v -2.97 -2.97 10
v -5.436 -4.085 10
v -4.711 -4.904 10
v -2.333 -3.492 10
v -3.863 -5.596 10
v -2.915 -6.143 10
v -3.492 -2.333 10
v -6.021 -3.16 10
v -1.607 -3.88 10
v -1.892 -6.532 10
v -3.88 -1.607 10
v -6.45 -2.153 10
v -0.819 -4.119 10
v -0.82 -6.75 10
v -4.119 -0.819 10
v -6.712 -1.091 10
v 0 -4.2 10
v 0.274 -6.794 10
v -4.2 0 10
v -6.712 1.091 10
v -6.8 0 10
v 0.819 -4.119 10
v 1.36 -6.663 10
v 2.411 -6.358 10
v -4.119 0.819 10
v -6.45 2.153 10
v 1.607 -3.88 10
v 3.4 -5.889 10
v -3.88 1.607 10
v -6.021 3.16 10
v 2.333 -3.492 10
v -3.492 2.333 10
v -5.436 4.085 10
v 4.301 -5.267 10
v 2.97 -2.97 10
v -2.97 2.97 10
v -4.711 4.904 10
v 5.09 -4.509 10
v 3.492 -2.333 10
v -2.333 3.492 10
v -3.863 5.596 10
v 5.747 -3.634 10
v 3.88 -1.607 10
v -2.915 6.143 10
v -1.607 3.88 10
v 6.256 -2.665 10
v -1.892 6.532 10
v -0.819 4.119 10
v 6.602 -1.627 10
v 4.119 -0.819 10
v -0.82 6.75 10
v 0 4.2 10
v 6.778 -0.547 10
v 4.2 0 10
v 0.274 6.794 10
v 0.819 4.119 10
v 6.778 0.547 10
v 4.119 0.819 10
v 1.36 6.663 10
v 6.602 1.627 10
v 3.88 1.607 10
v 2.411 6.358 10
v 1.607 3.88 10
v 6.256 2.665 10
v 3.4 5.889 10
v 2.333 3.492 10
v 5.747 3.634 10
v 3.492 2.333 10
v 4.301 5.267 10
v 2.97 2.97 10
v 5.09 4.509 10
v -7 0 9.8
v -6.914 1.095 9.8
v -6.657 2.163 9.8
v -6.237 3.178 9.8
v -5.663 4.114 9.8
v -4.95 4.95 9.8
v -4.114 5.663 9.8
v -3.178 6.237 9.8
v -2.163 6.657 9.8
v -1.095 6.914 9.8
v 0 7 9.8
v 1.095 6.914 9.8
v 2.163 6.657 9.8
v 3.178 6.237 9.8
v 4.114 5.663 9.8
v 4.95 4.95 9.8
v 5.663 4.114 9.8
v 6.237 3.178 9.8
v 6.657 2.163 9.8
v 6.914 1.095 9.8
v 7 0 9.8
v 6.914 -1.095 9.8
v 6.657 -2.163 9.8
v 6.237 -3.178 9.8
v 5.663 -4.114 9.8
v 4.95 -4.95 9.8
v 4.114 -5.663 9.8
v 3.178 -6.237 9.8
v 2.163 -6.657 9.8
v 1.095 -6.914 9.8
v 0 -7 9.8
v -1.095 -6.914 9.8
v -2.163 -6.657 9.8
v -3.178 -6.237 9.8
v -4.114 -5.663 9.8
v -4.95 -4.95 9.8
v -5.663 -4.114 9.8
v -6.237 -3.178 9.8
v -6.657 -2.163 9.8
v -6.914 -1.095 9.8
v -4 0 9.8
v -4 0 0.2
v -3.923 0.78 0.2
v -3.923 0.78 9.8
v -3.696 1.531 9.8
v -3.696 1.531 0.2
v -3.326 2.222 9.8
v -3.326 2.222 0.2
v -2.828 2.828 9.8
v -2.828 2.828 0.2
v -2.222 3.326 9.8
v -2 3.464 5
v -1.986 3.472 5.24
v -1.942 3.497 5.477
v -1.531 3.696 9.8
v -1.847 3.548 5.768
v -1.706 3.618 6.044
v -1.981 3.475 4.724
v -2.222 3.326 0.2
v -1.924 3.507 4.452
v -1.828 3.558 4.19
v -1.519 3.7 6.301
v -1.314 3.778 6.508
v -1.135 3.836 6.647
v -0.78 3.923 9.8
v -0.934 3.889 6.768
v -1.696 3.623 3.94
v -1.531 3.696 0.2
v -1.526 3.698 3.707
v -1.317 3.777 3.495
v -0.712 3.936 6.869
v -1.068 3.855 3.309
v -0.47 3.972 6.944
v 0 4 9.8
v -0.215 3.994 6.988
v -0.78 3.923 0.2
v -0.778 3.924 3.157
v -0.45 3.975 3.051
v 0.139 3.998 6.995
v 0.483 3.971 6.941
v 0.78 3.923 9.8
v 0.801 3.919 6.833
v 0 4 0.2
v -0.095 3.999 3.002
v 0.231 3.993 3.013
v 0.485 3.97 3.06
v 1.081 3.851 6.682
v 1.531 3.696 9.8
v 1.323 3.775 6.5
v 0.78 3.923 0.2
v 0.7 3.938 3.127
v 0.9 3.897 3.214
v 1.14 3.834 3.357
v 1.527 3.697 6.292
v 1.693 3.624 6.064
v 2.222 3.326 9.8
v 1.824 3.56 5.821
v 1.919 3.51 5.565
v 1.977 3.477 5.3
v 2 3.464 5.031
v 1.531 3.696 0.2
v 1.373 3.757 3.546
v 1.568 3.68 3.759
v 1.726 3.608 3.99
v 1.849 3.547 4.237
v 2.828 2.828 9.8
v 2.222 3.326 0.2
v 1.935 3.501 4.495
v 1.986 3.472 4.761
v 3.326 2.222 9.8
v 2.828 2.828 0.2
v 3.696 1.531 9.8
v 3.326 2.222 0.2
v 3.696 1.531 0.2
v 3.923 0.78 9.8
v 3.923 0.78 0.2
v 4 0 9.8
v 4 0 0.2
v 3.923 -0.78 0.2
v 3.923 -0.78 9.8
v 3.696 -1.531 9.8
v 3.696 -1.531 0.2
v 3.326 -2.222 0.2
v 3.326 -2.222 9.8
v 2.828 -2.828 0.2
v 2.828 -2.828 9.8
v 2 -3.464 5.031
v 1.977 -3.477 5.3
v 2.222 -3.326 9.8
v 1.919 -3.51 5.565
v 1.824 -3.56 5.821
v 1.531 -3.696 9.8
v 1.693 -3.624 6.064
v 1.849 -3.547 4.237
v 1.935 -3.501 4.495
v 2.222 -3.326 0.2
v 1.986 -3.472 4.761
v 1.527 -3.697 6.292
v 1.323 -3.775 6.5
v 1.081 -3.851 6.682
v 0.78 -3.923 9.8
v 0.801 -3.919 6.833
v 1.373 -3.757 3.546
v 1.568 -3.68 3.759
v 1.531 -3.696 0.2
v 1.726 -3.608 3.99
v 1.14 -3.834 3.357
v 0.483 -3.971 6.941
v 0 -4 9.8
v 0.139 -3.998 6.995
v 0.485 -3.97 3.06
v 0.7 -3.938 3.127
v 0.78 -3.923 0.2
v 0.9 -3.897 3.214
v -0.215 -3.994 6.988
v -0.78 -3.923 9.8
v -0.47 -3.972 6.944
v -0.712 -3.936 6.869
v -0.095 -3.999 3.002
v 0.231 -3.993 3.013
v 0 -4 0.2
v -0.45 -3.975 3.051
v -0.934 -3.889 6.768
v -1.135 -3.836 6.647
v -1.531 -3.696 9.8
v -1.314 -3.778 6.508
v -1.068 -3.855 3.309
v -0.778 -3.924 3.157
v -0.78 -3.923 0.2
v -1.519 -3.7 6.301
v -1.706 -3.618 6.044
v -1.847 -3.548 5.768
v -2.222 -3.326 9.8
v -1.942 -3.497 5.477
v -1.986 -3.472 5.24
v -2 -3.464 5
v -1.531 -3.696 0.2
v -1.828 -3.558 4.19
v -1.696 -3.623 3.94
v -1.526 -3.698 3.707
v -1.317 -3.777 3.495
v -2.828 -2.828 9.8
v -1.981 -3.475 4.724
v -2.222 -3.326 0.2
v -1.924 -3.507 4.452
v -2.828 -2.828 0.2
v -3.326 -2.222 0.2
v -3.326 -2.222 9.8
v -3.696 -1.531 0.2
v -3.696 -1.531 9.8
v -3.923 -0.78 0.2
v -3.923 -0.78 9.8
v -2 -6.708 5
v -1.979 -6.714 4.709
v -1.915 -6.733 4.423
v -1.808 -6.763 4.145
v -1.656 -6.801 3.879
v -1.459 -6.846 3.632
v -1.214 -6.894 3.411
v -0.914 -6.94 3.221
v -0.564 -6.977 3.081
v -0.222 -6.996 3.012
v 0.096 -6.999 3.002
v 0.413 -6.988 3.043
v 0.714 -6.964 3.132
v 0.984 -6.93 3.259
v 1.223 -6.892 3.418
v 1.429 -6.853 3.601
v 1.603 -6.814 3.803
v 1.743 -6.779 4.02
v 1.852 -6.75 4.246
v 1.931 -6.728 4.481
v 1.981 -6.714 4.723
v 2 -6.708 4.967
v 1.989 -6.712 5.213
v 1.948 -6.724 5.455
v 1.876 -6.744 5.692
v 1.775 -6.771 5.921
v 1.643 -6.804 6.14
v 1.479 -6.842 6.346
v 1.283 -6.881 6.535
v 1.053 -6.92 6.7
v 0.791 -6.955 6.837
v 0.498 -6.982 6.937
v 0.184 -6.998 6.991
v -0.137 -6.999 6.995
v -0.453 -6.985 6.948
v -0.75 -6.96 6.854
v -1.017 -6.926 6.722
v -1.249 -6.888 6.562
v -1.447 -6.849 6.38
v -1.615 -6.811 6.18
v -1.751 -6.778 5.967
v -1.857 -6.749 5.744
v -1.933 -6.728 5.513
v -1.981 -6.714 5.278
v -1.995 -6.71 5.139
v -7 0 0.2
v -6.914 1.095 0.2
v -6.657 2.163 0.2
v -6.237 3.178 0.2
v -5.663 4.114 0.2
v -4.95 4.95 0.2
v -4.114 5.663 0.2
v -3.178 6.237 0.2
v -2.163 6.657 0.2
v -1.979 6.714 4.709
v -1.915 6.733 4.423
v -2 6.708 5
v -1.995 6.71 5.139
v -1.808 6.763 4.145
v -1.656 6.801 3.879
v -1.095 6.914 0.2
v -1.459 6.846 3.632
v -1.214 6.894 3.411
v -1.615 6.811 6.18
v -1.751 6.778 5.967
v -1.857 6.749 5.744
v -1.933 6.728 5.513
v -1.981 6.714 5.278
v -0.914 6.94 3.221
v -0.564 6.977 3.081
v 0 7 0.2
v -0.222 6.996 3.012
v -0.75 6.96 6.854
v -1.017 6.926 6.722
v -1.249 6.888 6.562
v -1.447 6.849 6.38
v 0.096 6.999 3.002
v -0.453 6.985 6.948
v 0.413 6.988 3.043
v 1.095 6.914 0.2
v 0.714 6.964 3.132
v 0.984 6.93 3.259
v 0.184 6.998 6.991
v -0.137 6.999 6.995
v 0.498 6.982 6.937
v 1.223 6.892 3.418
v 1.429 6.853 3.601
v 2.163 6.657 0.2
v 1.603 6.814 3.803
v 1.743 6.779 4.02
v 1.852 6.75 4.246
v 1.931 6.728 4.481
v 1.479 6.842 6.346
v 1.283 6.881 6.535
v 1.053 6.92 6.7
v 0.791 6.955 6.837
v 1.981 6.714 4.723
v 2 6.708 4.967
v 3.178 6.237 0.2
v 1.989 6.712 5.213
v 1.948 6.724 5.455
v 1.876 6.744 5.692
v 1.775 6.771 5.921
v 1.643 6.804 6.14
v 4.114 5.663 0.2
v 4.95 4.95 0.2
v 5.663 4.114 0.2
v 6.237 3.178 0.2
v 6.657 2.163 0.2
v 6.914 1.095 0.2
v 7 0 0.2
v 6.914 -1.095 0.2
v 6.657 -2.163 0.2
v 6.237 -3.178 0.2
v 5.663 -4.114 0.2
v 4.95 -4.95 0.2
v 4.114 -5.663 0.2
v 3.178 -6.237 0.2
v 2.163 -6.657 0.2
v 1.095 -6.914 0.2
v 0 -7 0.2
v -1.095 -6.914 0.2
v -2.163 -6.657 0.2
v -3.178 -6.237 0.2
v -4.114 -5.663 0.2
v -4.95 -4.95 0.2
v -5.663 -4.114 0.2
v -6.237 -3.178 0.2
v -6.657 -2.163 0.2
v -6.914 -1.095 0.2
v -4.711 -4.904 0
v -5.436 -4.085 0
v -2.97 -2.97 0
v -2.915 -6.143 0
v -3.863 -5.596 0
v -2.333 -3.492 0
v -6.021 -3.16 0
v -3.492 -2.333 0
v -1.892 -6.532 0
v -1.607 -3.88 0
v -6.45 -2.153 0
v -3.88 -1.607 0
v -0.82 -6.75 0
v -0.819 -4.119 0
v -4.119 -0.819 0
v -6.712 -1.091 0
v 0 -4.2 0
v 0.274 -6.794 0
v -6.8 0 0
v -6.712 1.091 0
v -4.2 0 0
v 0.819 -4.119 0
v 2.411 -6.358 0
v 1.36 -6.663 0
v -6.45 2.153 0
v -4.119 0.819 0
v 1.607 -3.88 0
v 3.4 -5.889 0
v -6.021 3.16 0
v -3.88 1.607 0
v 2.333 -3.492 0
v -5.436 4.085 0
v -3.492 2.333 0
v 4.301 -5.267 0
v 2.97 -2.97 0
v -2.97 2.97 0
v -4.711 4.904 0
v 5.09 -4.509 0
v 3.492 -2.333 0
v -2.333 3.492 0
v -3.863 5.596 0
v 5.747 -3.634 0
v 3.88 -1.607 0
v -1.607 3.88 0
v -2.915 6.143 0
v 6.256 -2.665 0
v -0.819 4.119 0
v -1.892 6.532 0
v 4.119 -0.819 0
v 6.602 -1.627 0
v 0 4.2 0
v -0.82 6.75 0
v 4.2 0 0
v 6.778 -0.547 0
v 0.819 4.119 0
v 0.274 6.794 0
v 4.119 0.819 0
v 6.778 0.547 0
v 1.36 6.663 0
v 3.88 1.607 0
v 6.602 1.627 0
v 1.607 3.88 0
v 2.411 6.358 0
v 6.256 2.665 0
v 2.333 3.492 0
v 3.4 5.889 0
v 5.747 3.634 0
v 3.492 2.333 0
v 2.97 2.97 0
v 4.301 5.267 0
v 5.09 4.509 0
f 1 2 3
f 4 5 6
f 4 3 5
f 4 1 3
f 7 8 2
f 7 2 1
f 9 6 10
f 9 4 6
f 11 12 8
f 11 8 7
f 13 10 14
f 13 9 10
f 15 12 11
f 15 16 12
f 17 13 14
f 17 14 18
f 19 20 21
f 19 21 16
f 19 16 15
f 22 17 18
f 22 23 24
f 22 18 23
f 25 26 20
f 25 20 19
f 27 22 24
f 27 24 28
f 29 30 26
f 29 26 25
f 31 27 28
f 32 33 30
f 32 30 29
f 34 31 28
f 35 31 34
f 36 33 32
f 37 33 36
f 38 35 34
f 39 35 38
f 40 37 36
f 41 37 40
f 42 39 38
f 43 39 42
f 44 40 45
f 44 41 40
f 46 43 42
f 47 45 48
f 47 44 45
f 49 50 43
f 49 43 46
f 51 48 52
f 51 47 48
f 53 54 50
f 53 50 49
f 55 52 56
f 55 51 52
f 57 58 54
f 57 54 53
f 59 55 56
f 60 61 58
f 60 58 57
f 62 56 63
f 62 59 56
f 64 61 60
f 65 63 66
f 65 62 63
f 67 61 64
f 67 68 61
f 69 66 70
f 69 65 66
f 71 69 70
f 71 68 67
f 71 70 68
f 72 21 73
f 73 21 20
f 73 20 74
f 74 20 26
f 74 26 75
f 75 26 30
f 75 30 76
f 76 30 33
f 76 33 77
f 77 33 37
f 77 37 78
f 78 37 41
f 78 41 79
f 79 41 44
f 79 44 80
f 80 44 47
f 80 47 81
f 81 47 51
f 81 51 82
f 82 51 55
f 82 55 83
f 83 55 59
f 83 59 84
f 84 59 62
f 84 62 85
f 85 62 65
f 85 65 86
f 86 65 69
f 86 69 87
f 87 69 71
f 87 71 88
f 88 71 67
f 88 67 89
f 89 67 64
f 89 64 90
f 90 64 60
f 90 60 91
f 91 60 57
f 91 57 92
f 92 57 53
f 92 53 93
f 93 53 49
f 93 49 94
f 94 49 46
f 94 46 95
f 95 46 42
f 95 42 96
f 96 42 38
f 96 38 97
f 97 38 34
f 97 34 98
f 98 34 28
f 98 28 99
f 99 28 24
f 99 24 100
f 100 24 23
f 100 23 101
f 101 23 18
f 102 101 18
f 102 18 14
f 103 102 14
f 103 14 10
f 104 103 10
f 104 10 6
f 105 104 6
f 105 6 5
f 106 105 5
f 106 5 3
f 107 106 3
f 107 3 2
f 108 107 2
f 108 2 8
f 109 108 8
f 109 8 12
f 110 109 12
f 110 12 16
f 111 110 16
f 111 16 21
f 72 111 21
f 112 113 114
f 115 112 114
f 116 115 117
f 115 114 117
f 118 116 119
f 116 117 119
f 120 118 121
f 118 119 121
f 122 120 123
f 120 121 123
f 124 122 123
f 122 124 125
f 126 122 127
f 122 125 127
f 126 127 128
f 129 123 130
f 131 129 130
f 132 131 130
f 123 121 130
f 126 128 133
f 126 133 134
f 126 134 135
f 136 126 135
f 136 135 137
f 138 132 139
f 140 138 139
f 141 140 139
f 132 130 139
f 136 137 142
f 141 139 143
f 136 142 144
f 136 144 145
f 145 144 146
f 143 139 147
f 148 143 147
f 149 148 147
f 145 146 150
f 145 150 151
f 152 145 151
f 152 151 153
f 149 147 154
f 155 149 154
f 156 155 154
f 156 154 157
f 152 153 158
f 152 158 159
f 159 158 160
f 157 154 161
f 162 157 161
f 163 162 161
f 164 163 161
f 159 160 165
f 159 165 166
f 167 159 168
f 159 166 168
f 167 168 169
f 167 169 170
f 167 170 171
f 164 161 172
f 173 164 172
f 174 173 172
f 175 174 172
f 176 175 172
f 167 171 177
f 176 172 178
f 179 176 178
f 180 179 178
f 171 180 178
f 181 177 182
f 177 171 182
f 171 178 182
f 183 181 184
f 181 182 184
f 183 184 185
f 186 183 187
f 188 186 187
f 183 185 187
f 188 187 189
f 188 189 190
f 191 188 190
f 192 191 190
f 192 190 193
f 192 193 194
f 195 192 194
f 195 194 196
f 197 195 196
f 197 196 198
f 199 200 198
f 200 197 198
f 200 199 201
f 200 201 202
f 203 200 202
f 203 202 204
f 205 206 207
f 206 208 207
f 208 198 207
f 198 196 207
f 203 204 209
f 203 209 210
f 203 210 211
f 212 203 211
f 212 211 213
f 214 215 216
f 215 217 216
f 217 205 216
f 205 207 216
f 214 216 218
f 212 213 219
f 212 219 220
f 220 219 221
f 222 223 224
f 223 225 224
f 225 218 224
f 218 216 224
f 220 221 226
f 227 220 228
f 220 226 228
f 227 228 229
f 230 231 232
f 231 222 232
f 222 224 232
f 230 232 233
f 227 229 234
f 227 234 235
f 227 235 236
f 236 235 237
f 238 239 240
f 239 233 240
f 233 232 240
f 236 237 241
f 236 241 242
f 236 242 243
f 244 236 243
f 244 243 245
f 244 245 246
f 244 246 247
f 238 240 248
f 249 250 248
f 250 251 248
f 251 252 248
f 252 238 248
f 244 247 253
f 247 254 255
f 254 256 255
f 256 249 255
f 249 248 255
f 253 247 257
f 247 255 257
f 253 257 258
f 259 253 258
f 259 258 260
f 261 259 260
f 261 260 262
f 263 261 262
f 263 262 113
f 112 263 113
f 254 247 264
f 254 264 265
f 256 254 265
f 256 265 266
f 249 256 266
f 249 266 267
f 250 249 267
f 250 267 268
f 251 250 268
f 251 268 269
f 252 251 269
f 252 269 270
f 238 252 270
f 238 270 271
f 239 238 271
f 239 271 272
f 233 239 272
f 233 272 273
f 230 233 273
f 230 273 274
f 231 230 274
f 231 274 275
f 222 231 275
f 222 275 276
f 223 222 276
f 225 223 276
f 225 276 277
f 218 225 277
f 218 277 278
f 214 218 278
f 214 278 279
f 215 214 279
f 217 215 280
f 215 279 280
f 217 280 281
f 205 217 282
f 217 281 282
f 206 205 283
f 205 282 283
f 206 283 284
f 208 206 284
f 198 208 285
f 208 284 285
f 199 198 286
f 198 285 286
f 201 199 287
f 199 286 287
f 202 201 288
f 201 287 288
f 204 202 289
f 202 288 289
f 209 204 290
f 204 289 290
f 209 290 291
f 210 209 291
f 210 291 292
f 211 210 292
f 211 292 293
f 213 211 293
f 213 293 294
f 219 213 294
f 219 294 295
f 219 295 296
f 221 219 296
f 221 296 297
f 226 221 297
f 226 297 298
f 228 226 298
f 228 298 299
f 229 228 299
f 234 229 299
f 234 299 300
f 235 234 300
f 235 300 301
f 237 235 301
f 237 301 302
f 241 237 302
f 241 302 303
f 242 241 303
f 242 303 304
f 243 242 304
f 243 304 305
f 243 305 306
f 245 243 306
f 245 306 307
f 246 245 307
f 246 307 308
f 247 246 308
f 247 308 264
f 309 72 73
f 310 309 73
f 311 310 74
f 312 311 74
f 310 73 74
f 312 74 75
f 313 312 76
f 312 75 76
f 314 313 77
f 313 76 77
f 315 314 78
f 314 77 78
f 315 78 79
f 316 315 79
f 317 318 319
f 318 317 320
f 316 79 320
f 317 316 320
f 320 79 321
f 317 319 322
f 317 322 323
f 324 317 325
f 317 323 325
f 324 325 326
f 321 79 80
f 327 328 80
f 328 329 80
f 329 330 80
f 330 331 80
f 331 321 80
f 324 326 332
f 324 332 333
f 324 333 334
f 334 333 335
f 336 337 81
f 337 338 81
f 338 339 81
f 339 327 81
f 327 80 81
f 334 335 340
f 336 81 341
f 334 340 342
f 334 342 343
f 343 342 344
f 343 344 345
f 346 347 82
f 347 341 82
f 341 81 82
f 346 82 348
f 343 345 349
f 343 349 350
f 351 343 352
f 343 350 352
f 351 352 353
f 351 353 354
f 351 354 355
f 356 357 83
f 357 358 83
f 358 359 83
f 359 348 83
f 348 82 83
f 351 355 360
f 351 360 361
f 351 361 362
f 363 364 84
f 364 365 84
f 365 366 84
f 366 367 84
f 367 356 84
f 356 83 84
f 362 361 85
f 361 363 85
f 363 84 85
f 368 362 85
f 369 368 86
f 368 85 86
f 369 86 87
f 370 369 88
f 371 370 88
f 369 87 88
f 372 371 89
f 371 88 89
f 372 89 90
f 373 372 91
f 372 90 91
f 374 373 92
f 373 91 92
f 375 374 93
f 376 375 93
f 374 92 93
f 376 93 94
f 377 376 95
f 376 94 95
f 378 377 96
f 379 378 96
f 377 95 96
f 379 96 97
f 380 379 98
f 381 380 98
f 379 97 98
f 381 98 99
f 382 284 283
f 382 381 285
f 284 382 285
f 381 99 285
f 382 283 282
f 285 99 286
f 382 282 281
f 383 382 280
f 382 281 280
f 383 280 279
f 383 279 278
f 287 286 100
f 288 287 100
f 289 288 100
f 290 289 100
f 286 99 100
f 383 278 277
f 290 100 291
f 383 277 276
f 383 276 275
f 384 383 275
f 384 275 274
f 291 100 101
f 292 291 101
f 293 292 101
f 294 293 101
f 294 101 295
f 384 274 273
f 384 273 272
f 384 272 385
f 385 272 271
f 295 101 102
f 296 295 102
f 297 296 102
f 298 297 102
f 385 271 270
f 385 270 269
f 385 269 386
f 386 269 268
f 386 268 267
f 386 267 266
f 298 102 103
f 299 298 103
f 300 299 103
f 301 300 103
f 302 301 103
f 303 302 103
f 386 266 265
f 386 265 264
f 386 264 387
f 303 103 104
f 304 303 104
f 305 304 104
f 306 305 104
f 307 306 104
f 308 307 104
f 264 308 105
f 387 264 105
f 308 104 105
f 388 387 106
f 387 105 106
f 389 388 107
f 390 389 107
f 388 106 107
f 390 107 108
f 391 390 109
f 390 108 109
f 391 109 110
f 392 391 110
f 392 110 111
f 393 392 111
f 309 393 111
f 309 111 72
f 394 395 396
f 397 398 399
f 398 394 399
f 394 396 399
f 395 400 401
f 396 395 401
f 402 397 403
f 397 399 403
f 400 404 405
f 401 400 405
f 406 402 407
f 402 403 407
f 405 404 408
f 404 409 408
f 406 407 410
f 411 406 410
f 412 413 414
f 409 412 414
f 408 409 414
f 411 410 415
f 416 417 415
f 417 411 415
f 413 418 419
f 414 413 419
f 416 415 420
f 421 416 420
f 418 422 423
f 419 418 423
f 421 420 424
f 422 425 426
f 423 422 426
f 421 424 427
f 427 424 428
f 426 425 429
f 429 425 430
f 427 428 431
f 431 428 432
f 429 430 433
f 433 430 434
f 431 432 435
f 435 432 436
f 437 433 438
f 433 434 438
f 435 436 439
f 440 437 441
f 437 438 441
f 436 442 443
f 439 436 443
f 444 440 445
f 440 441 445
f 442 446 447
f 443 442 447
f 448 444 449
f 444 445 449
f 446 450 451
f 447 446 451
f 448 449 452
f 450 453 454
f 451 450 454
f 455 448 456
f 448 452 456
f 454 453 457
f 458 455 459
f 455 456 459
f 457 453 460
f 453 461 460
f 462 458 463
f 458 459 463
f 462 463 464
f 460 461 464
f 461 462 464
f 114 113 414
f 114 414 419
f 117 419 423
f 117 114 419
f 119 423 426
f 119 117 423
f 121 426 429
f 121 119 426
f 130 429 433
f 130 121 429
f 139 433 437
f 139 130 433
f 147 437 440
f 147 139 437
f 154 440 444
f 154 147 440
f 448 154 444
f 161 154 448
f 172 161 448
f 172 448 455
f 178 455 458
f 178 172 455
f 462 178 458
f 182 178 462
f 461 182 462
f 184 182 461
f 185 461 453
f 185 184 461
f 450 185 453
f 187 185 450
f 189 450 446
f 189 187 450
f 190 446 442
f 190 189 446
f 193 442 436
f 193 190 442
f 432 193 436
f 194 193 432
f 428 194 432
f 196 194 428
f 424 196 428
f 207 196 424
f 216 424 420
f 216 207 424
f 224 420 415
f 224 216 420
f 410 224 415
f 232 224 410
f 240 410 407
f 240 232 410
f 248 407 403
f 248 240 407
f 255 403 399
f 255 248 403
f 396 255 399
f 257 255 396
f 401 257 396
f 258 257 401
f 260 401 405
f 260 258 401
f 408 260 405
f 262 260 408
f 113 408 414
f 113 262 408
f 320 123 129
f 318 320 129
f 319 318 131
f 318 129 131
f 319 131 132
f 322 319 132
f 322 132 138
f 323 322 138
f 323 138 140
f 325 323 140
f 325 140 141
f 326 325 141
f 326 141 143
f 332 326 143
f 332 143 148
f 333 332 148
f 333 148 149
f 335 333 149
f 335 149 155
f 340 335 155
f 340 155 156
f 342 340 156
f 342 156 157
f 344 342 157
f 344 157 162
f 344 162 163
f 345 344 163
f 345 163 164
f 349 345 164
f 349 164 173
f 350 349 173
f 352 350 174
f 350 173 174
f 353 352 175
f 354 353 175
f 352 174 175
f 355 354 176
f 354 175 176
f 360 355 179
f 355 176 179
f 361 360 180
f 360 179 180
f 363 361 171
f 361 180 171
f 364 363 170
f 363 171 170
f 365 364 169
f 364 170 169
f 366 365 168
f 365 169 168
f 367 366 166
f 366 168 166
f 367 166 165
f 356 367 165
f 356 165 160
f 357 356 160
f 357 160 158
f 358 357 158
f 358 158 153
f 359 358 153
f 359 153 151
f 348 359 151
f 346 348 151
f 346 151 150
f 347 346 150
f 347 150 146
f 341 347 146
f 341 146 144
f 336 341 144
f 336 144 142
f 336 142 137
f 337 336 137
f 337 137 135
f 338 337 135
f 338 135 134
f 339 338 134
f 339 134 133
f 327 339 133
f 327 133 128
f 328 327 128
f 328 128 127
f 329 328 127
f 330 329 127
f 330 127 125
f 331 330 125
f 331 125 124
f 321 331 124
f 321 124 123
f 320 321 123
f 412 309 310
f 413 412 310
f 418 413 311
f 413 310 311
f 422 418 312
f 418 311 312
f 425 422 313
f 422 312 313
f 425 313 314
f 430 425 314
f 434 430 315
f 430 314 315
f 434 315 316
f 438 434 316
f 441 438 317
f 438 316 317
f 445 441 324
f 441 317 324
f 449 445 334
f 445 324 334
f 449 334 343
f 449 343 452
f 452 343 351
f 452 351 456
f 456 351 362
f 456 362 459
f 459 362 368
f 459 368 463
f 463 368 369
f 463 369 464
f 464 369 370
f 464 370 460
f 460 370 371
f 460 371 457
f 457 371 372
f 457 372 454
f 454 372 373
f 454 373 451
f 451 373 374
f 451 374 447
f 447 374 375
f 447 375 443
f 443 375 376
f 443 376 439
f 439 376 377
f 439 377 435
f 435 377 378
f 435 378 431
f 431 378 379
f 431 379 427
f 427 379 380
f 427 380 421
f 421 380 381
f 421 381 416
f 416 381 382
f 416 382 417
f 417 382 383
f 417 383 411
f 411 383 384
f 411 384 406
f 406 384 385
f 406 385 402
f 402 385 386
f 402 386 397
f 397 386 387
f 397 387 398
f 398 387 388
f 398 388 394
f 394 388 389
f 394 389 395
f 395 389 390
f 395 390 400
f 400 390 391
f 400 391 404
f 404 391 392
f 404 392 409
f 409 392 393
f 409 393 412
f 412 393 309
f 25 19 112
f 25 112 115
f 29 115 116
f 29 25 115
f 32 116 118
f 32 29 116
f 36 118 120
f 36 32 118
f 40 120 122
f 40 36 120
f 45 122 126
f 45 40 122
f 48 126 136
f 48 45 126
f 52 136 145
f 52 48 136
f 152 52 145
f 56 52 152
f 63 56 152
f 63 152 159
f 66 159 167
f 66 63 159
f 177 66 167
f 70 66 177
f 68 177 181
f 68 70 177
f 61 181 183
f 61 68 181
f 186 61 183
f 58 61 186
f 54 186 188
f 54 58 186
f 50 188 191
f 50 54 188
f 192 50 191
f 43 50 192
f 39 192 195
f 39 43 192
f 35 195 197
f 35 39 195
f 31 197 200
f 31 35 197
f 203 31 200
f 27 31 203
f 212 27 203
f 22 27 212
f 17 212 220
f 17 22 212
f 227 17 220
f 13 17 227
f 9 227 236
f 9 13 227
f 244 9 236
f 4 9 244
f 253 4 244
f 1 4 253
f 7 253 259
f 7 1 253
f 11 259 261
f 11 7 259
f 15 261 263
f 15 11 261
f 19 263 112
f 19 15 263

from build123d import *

# Parameters (mm, degrees)
SKETCH1_W                    = 7
SKETCH1_H                    = 10
F_8_0_8_DIAMETER_HOLE1_D     = 8
F_4_0_4_DIAMETER_HOLE1_D     = 4
F_4_0_4_DIAMETER_HOLE1_DEPTH = 17.535898385
CHAMFER1_SIZE                = 0.2


with BuildPart() as part:
    # Sketch1 → Revolve1 (revolve)
    with BuildSketch(Plane.XZ, mode=Mode.PRIVATE) as revolve1_sk:
        with Locations((3.5, 5)):
            Rectangle(SKETCH1_W, SKETCH1_H)
    revolve(revolve1_sk.sketch.rotate(Axis((0, 0, 10), (0, 0, -1)), 180), axis=Axis((0, 0, 10), (0, 0, -1)))

    # Ø8.0 (8) Diameter Hole1 (through all)
    with Locations(Plane.XY.offset(10)):
        with Locations((0, 0)):
            Hole(F_8_0_8_DIAMETER_HOLE1_D / 2)

    # Ø4.0 (4) Diameter Hole1
    with Locations(Plane(origin=(0, 7, 5), x_dir=(1, 0, 0), z_dir=(0, 1, 0))):
        with Locations((0, 0)):
            Hole(F_4_0_4_DIAMETER_HOLE1_D / 2, depth=F_4_0_4_DIAMETER_HOLE1_DEPTH)

    # Chamfer1
    chamfer1_edges = [part.edges().sort_by_distance(p)[0] for p in [
        (4, 0, 10),
        (4, 0, 0),
        (7, 0, 0),
        (7, 0, 10),
    ]]
    chamfer(chamfer1_edges, length=CHAMFER1_SIZE)


solid = part.part
